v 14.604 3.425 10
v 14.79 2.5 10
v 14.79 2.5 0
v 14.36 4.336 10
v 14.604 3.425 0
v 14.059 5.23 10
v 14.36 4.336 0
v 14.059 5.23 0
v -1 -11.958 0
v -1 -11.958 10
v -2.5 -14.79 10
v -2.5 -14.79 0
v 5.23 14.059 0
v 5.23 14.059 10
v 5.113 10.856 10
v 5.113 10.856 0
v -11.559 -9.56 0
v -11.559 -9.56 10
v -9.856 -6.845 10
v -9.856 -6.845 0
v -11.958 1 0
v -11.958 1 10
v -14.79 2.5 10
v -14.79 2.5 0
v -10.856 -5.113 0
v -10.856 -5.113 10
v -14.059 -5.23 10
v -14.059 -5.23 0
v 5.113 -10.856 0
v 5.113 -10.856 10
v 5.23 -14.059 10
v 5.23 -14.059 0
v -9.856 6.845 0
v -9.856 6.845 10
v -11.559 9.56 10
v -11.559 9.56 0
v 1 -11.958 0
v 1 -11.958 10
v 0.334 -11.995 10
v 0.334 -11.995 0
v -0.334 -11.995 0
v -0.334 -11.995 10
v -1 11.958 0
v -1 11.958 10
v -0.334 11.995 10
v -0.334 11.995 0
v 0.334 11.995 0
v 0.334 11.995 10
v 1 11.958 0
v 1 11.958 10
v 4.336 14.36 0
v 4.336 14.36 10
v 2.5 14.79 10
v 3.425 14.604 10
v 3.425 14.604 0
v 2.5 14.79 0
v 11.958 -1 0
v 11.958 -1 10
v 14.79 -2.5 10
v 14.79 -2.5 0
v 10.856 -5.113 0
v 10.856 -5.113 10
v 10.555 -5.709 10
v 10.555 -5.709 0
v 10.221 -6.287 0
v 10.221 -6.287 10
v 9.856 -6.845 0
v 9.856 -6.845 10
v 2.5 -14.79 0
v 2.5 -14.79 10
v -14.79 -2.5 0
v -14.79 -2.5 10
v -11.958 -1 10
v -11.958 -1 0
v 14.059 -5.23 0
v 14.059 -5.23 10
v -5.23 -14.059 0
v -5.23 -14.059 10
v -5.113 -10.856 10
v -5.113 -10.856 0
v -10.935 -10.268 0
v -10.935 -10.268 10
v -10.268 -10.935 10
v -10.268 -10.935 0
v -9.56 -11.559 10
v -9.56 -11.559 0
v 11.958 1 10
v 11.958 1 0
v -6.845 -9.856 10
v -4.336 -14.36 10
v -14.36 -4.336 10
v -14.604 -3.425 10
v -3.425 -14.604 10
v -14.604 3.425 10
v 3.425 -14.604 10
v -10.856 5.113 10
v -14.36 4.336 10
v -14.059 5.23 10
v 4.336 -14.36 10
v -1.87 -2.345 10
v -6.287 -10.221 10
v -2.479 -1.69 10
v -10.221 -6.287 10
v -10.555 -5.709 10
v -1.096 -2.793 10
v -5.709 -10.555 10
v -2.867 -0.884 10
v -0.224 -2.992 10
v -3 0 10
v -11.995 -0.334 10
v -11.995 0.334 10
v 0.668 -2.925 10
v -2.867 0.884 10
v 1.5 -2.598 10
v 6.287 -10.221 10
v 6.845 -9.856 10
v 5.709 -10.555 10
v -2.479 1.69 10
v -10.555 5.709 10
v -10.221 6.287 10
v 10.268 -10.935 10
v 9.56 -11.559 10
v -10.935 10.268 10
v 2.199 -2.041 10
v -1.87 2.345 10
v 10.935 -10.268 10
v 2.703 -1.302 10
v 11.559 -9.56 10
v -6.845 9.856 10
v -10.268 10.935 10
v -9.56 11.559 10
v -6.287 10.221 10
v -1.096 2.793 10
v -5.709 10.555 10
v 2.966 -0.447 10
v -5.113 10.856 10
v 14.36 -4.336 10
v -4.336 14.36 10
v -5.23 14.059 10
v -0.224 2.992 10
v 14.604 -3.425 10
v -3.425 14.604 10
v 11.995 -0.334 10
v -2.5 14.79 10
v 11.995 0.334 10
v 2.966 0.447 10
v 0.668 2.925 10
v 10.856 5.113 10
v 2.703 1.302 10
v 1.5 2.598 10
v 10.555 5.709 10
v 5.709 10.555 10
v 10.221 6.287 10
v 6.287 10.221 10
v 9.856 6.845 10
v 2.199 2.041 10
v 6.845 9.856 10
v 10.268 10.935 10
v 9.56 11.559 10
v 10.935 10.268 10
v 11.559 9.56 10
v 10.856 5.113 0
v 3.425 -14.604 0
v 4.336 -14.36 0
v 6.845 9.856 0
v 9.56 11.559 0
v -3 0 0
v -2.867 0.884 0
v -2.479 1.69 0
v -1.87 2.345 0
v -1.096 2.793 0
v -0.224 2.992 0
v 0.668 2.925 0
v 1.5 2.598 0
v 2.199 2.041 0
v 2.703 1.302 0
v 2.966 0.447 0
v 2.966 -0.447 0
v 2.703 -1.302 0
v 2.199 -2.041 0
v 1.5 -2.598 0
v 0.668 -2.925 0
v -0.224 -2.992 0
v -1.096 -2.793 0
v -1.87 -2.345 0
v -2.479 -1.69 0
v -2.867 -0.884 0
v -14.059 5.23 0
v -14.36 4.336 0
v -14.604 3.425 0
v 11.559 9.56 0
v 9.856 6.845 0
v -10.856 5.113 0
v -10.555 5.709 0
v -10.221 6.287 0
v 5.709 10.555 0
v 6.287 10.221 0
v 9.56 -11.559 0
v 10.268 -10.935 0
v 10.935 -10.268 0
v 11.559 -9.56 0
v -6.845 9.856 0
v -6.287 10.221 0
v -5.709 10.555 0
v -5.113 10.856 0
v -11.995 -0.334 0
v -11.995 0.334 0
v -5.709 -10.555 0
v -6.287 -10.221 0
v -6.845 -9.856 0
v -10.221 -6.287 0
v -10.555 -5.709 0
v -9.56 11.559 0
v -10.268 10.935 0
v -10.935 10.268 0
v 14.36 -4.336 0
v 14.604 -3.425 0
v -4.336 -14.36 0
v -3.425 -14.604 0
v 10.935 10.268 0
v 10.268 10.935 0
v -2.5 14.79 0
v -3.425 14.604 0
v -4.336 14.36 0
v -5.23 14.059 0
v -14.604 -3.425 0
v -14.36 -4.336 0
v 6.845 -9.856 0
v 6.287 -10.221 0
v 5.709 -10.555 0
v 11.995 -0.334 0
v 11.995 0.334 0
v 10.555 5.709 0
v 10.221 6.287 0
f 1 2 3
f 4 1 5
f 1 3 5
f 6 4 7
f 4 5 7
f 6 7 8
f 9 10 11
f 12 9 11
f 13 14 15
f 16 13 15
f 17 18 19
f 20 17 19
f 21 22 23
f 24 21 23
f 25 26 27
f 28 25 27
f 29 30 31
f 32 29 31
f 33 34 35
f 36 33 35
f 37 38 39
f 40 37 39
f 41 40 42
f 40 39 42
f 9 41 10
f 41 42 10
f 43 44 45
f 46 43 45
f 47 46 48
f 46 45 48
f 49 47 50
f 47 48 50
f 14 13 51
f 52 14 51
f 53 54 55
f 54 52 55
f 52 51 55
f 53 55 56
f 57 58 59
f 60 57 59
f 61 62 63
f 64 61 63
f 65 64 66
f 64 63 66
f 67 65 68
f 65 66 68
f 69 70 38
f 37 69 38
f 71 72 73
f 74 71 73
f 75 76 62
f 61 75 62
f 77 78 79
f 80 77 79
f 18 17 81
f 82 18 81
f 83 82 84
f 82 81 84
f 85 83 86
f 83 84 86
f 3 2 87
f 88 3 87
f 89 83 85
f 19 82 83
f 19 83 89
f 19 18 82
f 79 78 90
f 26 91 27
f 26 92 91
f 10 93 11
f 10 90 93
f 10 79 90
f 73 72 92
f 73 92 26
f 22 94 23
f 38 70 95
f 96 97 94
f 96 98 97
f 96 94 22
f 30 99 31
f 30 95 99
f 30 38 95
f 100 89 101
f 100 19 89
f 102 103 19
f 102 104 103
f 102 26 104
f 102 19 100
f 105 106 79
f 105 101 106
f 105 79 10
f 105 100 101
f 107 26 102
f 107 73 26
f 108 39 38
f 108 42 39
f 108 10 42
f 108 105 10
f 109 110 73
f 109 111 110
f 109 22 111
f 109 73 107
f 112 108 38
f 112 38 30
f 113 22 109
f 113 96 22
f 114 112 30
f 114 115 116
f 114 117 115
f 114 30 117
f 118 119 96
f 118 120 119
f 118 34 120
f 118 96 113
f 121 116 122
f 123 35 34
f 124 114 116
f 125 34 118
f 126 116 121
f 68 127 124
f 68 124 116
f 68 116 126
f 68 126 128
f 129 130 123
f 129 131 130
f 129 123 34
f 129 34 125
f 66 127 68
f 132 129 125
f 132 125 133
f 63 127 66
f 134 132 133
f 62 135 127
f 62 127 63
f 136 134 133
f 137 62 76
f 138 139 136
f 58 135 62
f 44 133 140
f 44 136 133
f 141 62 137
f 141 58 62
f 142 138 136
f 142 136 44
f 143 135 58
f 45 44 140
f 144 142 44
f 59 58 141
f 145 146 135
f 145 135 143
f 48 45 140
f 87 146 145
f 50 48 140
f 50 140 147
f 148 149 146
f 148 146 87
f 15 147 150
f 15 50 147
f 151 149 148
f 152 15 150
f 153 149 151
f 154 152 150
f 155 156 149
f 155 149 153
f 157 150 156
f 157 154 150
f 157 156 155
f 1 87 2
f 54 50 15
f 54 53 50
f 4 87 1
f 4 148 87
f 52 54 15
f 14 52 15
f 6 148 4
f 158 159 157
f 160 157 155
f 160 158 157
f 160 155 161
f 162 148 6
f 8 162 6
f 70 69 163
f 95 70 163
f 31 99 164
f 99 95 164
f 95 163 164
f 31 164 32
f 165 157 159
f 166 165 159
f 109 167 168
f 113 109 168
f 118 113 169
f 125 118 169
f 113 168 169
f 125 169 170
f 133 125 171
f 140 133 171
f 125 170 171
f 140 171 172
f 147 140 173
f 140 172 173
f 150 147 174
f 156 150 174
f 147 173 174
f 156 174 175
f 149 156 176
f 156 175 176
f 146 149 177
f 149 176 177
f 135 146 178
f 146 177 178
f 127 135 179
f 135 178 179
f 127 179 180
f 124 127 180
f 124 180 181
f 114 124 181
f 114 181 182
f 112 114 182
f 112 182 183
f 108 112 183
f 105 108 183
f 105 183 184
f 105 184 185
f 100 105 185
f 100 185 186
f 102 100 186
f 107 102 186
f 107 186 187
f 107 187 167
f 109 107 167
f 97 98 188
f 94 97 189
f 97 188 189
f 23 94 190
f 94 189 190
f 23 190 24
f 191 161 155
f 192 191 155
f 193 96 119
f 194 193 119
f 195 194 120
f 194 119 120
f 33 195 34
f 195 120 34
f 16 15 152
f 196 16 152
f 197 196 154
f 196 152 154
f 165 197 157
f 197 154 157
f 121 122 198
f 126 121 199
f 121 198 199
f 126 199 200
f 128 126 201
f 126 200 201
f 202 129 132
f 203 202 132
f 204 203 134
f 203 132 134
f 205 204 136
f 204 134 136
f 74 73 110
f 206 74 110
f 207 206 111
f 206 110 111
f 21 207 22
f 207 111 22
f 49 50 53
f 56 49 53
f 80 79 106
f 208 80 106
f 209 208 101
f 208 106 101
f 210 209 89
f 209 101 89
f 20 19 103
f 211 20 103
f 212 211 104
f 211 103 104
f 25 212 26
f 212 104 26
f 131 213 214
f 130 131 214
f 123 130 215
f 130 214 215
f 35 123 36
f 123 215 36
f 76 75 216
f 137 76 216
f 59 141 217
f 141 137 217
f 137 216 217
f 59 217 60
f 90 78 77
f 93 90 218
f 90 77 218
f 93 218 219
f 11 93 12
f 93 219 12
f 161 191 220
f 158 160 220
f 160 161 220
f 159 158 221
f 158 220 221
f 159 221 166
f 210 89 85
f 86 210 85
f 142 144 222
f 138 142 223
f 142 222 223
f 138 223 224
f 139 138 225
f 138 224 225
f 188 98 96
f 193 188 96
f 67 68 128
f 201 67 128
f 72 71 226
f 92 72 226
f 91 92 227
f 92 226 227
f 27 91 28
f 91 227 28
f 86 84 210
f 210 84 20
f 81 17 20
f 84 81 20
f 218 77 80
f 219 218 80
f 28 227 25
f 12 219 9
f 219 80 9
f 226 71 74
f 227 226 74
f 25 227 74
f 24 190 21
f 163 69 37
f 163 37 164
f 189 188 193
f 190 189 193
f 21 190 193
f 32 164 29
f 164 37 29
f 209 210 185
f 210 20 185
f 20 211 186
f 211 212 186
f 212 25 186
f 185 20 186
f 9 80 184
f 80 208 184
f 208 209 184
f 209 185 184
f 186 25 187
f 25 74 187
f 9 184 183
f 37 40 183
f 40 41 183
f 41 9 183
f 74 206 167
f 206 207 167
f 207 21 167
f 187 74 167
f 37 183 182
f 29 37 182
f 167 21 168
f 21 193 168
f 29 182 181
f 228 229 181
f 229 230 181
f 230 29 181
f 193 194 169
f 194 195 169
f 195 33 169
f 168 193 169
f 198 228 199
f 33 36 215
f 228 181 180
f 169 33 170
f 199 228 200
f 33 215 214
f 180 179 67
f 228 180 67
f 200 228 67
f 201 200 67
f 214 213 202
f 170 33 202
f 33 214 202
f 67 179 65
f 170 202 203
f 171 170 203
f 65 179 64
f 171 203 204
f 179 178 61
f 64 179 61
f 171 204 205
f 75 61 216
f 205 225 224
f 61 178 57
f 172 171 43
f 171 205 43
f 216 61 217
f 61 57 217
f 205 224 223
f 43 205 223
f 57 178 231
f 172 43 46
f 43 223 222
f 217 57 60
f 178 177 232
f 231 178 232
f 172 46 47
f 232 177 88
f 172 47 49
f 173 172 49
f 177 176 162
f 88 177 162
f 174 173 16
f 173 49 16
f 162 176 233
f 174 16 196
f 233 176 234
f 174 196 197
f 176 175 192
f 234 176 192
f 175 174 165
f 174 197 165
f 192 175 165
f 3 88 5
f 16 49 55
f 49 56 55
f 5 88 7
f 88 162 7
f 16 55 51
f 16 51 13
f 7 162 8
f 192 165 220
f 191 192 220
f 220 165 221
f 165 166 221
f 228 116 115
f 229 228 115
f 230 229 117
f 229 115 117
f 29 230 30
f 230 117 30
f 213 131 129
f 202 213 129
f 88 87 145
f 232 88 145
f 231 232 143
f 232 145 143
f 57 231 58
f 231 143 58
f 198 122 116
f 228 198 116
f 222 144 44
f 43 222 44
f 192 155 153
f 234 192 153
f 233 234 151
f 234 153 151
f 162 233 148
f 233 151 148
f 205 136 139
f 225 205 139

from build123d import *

# Parameters (mm, degrees)
SKETCH1_R           = 15
BOSS_EXTRUDE1_DEPTH = 10
CUT_EXTRUDE1_DEPTH  = 10
CIRPATTERN1_COUNT   = 12
SKETCH3_R           = 3
CUT_EXTRUDE2_DEPTH  = 11


with BuildPart() as part:
    # Sketch1 → Boss-Extrude1 (new body)
    with BuildSketch(Plane.XY):
        Circle(SKETCH1_R)
    extrude(amount=BOSS_EXTRUDE1_DEPTH)

    # Sketch2 → Cut-Extrude1 (cut)
    with BuildSketch(Plane.XY.offset(10)):
        with BuildLine():
            Line((-2.5, 14.790199458), (-1, 11.958260743))
            ThreePointArc((-1, 11.958260743), (0, 12), (1, 11.958260743))
            Line((1, 11.958260743), (2.5, 14.790199458))
            ThreePointArc((2.5, 14.790199458), (0, 15), (-2.5, 14.790199458))
        make_face()
    cut_extrude1 = extrude(amount=-CUT_EXTRUDE1_DEPTH, mode=Mode.SUBTRACT)

    # CirPattern1: Cut-Extrude1 ×12 about axis
    cirpattern1_axis = Axis((0, 0, 0), (0, 0, 1))
    for i in range(1, CIRPATTERN1_COUNT):
        add(cut_extrude1.rotate(cirpattern1_axis, i * 360 / CIRPATTERN1_COUNT), mode=Mode.SUBTRACT)

    # Sketch3 → Cut-Extrude2 (cut, through all)
    with BuildSketch(Plane(origin=(0, 0, 0), x_dir=(-1, 0, 0), z_dir=(0, 0, -1))):
        Circle(SKETCH3_R)
    extrude(amount=-CUT_EXTRUDE2_DEPTH, mode=Mode.SUBTRACT)


solid = part.part
